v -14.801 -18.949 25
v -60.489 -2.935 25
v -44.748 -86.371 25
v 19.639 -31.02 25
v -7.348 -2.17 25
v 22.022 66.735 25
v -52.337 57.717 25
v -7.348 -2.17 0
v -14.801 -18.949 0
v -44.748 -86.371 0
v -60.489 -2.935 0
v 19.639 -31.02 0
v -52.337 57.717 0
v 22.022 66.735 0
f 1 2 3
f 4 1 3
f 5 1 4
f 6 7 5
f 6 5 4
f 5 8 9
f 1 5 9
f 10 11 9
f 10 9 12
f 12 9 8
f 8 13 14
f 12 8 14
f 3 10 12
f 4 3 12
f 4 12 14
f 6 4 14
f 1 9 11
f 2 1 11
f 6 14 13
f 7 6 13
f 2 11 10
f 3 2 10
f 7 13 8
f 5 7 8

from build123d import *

# Parameters (mm, degrees)
F1_DEPTH = 25


with BuildPart() as f1:
    # F0 (on Top) → F1 (new body)
    with BuildSketch(Plane.XY):
        Polygon((19.639204, -31.020492), (22.021737, 66.735362), (-7.347822, -2.170143), (-14.800628, -18.949018), align=None)
        Polygon((-7.347822, -2.170143), (22.021737, 66.735362), (-52.33696, 57.717394), align=None)
        Polygon((-44.747901, -86.370811), (19.639204, -31.020492), (-14.800628, -18.949018), align=None)
        Polygon((-44.747901, -86.370811), (-14.800628, -18.949018), (-60.489131, -2.934784), align=None)
    extrude(amount=F1_DEPTH)


solid = f1.part
